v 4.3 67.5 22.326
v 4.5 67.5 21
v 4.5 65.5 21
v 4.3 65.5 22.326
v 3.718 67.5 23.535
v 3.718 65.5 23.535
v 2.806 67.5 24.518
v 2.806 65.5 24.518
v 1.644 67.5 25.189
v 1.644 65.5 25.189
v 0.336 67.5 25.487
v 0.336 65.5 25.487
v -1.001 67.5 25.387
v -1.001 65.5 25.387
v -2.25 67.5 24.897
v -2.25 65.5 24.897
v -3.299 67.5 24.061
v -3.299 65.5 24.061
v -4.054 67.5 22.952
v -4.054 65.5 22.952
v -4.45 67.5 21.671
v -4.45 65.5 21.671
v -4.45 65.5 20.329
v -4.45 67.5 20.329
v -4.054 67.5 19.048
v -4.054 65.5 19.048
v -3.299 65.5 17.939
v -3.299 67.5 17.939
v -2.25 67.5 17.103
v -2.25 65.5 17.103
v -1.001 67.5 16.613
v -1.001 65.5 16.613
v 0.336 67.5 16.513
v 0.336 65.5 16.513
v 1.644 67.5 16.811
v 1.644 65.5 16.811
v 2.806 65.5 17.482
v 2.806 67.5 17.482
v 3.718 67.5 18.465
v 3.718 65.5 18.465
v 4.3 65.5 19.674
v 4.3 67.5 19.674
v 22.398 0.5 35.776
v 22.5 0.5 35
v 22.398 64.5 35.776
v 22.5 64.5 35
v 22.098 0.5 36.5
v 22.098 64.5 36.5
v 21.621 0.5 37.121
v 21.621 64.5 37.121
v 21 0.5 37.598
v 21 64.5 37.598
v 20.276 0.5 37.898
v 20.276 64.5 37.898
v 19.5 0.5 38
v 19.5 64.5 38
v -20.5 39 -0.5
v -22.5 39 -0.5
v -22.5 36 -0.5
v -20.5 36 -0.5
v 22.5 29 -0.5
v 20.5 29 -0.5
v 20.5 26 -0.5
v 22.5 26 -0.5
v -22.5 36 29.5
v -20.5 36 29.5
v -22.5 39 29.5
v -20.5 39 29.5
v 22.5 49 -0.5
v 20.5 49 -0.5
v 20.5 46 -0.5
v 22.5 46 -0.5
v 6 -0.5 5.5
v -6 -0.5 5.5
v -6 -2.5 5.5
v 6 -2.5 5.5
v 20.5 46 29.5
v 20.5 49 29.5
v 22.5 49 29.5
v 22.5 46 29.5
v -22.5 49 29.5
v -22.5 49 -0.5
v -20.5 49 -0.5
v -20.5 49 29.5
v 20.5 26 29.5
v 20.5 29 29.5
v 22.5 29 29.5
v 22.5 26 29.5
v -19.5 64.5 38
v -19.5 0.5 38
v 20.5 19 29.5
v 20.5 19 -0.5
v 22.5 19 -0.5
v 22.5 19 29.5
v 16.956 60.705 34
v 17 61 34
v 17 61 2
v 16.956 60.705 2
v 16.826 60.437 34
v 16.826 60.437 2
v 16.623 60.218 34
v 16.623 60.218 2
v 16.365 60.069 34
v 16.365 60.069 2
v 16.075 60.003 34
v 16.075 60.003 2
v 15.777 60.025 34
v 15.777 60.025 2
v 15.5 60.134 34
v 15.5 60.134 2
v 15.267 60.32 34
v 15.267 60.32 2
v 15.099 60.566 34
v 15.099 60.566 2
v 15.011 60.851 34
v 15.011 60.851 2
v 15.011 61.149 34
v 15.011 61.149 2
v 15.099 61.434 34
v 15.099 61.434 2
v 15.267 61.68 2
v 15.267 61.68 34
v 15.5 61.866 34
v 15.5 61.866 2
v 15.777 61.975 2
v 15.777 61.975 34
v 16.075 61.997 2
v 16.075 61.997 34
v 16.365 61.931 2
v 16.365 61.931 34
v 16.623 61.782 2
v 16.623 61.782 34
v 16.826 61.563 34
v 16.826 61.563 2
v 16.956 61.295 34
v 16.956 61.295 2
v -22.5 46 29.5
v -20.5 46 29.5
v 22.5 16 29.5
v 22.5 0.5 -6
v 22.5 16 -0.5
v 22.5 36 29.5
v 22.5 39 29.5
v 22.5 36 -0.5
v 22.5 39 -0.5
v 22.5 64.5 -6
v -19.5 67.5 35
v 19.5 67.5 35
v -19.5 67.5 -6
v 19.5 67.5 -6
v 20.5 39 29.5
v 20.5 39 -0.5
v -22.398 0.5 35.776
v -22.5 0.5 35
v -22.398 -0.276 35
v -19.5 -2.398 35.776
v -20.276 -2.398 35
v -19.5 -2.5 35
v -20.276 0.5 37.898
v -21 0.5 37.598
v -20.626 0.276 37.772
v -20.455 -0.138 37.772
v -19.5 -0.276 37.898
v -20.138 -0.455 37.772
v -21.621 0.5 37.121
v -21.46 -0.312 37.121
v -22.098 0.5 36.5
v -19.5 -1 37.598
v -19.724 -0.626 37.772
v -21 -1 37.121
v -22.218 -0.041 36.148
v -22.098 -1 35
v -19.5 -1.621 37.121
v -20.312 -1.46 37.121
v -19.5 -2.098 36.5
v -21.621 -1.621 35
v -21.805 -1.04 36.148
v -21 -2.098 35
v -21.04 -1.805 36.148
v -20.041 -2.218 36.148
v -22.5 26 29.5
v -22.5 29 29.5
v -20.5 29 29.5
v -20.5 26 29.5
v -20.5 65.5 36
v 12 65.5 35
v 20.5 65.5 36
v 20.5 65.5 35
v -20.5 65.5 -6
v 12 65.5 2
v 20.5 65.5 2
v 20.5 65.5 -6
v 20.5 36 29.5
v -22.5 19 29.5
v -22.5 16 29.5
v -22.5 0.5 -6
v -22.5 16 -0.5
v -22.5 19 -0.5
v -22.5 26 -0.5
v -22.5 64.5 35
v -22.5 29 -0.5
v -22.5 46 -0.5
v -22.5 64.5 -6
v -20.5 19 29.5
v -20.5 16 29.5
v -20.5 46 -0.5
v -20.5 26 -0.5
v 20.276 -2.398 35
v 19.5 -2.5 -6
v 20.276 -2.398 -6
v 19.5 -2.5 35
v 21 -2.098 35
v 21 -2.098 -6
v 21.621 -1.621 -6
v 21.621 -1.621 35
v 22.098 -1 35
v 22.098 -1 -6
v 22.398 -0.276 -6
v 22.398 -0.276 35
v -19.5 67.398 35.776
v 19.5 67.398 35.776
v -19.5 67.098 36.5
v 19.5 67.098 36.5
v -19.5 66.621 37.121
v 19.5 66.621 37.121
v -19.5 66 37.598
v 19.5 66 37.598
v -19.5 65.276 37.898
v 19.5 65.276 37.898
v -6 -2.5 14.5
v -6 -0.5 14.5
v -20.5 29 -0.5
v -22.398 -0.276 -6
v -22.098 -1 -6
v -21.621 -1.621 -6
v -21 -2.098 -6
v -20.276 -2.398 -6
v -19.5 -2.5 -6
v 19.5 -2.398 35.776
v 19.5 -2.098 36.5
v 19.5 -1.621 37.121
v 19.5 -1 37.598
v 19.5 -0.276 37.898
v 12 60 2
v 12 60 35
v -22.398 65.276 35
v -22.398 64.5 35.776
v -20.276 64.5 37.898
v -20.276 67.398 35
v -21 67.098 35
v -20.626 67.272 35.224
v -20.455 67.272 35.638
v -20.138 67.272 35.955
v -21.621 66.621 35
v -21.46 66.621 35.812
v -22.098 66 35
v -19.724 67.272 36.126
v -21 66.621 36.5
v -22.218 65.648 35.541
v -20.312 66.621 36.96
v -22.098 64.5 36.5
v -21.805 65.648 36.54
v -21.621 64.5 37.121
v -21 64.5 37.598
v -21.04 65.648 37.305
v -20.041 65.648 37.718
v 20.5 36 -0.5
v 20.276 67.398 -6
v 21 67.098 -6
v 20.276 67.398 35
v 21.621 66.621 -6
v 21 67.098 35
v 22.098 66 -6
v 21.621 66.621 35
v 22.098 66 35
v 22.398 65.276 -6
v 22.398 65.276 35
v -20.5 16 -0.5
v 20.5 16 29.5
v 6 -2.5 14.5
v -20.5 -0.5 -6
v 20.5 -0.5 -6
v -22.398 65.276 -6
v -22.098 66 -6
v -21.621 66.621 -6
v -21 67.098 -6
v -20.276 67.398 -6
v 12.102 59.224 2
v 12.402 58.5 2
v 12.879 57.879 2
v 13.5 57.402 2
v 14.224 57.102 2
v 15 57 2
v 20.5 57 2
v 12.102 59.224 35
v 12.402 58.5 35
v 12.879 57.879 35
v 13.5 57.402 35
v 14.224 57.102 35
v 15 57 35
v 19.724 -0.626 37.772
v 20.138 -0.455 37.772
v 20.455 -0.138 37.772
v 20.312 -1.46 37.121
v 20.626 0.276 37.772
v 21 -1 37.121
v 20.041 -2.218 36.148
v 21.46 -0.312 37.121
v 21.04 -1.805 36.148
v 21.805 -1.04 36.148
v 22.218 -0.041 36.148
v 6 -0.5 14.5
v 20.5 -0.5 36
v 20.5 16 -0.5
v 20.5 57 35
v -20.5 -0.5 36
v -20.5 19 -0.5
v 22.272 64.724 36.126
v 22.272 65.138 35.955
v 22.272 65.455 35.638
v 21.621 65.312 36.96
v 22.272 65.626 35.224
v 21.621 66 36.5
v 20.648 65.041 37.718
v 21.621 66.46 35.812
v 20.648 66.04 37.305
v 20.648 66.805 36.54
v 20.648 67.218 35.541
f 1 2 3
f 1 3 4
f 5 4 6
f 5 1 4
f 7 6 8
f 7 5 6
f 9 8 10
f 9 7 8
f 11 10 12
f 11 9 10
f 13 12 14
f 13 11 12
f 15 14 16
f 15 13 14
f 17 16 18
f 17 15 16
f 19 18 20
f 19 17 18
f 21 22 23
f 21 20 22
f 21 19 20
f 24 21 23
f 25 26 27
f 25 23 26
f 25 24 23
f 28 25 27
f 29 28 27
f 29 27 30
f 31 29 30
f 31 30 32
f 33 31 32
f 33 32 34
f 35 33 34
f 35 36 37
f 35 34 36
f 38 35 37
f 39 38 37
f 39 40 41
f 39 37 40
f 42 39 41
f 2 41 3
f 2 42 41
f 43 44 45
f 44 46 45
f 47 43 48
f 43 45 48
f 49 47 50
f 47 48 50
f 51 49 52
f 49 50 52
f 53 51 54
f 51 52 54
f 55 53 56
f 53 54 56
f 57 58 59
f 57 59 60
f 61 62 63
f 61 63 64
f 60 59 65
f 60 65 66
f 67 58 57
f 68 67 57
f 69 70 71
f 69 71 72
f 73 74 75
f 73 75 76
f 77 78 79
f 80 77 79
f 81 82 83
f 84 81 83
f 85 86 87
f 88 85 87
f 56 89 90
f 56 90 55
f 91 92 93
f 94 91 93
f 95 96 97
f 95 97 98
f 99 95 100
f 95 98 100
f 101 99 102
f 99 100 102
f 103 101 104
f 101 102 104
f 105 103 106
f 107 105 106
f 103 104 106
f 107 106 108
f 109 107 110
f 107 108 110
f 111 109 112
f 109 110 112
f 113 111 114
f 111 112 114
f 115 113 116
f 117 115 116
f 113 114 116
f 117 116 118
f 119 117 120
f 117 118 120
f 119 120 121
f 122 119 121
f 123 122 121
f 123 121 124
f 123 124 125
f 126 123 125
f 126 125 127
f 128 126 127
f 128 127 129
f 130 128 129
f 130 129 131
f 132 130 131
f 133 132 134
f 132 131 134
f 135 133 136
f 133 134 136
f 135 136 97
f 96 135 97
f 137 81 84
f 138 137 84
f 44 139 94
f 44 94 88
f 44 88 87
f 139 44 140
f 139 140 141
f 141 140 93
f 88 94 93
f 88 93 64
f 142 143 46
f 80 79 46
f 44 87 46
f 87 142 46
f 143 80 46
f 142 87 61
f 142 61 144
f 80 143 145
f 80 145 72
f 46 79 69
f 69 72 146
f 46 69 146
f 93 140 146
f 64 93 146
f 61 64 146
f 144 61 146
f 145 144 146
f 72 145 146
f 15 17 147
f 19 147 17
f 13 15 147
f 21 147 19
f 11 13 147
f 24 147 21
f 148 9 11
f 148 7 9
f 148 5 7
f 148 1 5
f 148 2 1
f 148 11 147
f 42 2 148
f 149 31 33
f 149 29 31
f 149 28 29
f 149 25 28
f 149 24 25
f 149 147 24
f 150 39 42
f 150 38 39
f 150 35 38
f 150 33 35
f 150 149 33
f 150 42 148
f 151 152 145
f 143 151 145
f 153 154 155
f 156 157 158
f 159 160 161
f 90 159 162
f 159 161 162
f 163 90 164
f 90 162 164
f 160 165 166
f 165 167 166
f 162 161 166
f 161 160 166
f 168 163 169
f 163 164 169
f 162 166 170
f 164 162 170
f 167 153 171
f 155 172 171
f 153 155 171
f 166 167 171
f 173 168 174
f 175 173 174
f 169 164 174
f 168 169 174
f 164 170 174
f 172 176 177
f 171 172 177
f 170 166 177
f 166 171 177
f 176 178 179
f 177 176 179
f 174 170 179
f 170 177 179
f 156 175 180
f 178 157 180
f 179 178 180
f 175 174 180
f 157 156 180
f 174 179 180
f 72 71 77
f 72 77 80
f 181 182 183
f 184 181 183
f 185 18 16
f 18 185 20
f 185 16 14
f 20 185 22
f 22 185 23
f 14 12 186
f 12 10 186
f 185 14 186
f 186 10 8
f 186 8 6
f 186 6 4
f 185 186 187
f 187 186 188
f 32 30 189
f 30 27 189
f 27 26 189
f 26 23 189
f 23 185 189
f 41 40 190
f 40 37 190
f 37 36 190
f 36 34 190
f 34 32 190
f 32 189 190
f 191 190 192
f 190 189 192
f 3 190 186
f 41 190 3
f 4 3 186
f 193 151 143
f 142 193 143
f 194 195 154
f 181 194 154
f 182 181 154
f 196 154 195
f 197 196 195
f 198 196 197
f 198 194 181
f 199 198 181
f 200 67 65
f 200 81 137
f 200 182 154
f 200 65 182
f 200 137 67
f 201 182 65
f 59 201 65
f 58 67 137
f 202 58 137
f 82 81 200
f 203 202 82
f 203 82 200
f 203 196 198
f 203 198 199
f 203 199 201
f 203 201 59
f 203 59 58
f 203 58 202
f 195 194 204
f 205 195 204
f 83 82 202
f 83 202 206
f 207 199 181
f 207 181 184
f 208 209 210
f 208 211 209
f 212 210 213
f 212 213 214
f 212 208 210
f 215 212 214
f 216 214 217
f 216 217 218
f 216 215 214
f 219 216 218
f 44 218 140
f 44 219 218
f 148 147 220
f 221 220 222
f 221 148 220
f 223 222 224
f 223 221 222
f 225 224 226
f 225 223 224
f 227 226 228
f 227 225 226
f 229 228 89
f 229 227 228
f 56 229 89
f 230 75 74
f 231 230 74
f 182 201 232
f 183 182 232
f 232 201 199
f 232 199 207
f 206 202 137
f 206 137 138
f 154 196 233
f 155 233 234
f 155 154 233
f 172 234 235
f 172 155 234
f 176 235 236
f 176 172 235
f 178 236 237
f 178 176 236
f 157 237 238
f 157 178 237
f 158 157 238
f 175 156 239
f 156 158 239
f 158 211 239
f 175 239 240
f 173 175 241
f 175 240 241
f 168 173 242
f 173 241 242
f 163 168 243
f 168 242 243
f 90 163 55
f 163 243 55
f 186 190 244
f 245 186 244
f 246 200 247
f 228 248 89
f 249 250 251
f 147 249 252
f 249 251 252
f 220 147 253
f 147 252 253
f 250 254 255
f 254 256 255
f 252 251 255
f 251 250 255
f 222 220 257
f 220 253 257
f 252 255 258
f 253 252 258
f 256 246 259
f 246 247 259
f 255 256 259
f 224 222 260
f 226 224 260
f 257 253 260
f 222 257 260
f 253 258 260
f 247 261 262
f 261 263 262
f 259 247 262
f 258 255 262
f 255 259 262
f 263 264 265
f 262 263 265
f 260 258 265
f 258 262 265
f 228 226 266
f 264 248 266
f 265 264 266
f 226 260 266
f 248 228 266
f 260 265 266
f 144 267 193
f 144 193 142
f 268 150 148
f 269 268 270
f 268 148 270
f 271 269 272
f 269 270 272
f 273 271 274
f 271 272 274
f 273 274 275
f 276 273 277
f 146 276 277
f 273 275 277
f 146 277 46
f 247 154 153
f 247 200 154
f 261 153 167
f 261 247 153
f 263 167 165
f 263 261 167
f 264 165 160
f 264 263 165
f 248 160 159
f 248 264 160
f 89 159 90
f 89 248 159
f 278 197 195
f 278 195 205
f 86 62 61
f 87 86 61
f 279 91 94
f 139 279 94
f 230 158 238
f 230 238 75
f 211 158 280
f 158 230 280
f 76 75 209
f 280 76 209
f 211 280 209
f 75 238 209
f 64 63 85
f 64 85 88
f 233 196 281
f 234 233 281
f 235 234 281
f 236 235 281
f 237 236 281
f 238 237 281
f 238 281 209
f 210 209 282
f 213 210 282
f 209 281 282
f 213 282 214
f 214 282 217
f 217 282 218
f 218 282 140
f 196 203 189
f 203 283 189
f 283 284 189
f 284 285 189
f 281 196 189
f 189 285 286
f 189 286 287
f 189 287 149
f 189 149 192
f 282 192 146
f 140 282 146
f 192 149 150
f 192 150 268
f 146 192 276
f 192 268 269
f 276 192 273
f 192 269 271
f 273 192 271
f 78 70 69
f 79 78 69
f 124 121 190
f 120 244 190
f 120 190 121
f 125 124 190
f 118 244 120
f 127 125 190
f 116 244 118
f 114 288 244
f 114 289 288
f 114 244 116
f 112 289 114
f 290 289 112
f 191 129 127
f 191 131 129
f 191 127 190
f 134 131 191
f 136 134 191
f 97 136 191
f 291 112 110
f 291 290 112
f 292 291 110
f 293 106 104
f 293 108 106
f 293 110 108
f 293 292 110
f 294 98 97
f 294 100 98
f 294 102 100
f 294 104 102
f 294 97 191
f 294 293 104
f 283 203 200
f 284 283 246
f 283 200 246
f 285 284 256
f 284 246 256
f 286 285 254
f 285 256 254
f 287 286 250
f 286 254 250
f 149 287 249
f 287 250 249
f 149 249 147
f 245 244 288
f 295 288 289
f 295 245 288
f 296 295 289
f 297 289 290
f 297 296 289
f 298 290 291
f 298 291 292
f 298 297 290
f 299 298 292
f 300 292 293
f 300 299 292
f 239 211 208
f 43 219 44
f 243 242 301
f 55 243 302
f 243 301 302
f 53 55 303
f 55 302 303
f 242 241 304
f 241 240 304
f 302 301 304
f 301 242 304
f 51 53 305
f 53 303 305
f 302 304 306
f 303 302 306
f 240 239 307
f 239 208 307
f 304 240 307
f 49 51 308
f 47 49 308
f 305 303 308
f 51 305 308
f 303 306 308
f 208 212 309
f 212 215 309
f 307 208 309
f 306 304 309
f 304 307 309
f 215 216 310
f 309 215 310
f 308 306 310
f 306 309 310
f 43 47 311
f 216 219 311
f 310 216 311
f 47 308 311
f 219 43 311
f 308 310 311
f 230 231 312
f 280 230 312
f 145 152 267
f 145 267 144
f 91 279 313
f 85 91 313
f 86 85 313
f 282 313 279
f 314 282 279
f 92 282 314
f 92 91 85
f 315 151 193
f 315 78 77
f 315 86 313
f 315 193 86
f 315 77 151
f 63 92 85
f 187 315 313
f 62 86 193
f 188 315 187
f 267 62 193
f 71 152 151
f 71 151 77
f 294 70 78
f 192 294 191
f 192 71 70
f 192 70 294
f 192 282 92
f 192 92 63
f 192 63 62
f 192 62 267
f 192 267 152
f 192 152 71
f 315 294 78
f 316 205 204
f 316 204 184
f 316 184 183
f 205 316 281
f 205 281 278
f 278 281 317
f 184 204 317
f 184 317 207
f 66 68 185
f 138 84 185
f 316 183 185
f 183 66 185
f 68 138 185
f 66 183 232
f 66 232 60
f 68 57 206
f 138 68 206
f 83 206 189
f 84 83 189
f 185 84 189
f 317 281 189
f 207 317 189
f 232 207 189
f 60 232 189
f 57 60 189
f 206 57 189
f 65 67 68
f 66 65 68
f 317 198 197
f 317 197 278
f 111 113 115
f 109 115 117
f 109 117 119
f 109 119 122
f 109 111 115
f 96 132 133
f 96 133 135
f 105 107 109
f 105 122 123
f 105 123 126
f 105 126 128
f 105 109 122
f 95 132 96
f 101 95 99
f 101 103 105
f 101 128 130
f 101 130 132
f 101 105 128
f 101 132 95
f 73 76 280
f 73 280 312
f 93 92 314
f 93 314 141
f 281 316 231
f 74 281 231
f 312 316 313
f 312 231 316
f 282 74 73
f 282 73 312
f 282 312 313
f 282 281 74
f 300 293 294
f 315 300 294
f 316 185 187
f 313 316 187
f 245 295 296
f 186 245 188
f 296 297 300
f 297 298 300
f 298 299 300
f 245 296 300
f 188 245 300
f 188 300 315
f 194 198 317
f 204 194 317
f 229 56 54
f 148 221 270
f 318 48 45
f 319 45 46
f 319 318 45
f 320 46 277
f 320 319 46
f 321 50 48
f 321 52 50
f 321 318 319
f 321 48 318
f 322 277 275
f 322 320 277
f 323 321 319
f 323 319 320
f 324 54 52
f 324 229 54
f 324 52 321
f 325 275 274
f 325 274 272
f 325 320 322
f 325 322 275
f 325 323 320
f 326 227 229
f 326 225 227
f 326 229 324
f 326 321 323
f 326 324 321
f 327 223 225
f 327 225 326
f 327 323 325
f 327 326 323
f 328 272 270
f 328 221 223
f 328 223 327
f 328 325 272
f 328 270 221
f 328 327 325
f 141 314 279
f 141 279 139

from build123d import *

# Parameters (mm, degrees)
CYLINDER_R        = 1
CYLINDER_DEPTH    = 32
BOX002_W          = 10
BOX002_H          = 10
BOX002_DEPTH      = 33
FILLET_R          = 3
BOX003_W          = 12
BOX003_H          = 20
BOX003_DEPTH      = 9
CYLINDER001_R     = 4.5
CYLINDER001_DEPTH = 10
BOX004_W          = 60
BOX004_H          = 3
BOX004_DEPTH      = 30
ARRAY_Y_COUNT     = 4
ARRAY_Y_PITCH     = 10
BOX_W             = 41
BOX_H             = 66
BOX_DEPTH         = 44
BOX001_W          = 45
BOX001_H          = 70
BOX001_DEPTH      = 44
FILLET001_R       = 3


with BuildPart() as cylinder:
    # Cylinder → Cylinder (new body)
    with BuildSketch(Plane(origin=(4, 6, 2), x_dir=(1, 0, 0), z_dir=(0, 0, 1))):
        Circle(CYLINDER_R)
    extrude(amount=CYLINDER_DEPTH)


with BuildPart() as fillet_body:
    # Box002 → Box002 (new body)
    with BuildSketch(Plane.XY.offset(2)):
        with Locations((5, 5)):
            Rectangle(BOX002_W, BOX002_H)
    extrude(amount=BOX002_DEPTH)

    # Cut: cut Cylinder
    add(cylinder.part, mode=Mode.SUBTRACT)


with BuildPart() as fillet_body_1:
    # Cut placement: moved
    add(fillet_body.part.moved(Location((12, -2, 0))))

    # Fillet
    fillet_edges = [fillet_body_1.edges().sort_by_distance(p)[0] for p in [
        (12, 8, 18.5),
        (22, -2, 18.5),
    ]]
    fillet(fillet_edges, radius=FILLET_R)


with BuildPart() as part_mirroring:
    # Part__Mirroring: instance of Fillet body
    add(fillet_body_1.part.mirror(Plane(origin=(0, 0, 0), x_dir=(0, -1, 0), z_dir=(1, 0, 0))))


with BuildPart() as part_mirroring001:
    # Part__Mirroring001: instance of Part__Mirroring
    add(part_mirroring.part.mirror(Plane(origin=(0, 32.5, 0), x_dir=(1, 0, 0), z_dir=(0, 1, 0))))


with BuildPart() as part_mirroring002:
    # Part__Mirroring002: instance of Part__Mirroring001
    add(part_mirroring001.part.mirror(Plane(origin=(0, 0, 0), x_dir=(0, -1, 0), z_dir=(1, 0, 0))))


with BuildPart() as usb_hole_cube:
    # Box003 → Box003 (new body)
    with BuildSketch(Plane(origin=(-6, -8, 5.5), x_dir=(1, 0, 0), z_dir=(0, 0, 1))):
        with Locations((6, 10)):
            Rectangle(BOX003_W, BOX003_H)
    extrude(amount=BOX003_DEPTH)


with BuildPart() as wires_hole:
    # Cylinder001 → Cylinder001 (new body)
    with BuildSketch(Plane(origin=(0, 73, 21), x_dir=(1, 0, 0), z_dir=(0, -1, 0))):
        Circle(CYLINDER001_R)
    extrude(amount=CYLINDER001_DEPTH)


with BuildPart() as array:
    # Box004 → Box004 (new body)
    with BuildSketch(Plane(origin=(-31, 16, -0.5), x_dir=(1, 0, 0), z_dir=(0, 0, 1))):
        with Locations((30, 1.5)):
            Rectangle(BOX004_W, BOX004_H)
    extrude(amount=BOX004_DEPTH)

    # Array Y: Array ×4


with BuildPart() as array_1:
    add(array.part)
    with Locations(*[(0, i * ARRAY_Y_PITCH, 0) for i in range(1, ARRAY_Y_COUNT)]):
        add(array.part)


with BuildPart() as fusion:
    # Box → Box (new body)
    with BuildSketch(Plane(origin=(-20.5, -0.5, -8), x_dir=(1, 0, 0), z_dir=(0, 0, 1))):
        with Locations((20.5, 33)):
            Rectangle(BOX_W, BOX_H)
    extrude(amount=BOX_DEPTH)

    # Fusion: union usb hole cube, wires hole, Array
    add(usb_hole_cube.part)
    add(wires_hole.part)
    add(array_1.part)


with BuildPart() as fillet001:
    # Box001 → Box001 (new body)
    with BuildSketch(Plane(origin=(-22.5, -2.5, -6), x_dir=(1, 0, 0), z_dir=(0, 0, 1))):
        with Locations((22.5, 35)):
            Rectangle(BOX001_W, BOX001_H)
    extrude(amount=BOX001_DEPTH)

    # Cut001: cut Fusion
    add(fusion.part, mode=Mode.SUBTRACT)

    # Fusion001: union Part__Mirroring002
    add(part_mirroring002.part)

    # Fillet001
    fillet001_edges = [fillet001.edges().sort_by_distance(p)[0] for p in [
        (-22.5, -2.5, 16),
        (-22.5, 32.5, 38),
        (-22.5, 67.5, 16),
        (22.5, -2.5, 16),
        (0, -2.5, 38),
        (0, 67.5, 38),
        (22.5, 32.5, 38),
        (22.5, 67.5, 16),
    ]]
    fillet(fillet001_edges, radius=FILLET001_R)


solid = fillet001.part
